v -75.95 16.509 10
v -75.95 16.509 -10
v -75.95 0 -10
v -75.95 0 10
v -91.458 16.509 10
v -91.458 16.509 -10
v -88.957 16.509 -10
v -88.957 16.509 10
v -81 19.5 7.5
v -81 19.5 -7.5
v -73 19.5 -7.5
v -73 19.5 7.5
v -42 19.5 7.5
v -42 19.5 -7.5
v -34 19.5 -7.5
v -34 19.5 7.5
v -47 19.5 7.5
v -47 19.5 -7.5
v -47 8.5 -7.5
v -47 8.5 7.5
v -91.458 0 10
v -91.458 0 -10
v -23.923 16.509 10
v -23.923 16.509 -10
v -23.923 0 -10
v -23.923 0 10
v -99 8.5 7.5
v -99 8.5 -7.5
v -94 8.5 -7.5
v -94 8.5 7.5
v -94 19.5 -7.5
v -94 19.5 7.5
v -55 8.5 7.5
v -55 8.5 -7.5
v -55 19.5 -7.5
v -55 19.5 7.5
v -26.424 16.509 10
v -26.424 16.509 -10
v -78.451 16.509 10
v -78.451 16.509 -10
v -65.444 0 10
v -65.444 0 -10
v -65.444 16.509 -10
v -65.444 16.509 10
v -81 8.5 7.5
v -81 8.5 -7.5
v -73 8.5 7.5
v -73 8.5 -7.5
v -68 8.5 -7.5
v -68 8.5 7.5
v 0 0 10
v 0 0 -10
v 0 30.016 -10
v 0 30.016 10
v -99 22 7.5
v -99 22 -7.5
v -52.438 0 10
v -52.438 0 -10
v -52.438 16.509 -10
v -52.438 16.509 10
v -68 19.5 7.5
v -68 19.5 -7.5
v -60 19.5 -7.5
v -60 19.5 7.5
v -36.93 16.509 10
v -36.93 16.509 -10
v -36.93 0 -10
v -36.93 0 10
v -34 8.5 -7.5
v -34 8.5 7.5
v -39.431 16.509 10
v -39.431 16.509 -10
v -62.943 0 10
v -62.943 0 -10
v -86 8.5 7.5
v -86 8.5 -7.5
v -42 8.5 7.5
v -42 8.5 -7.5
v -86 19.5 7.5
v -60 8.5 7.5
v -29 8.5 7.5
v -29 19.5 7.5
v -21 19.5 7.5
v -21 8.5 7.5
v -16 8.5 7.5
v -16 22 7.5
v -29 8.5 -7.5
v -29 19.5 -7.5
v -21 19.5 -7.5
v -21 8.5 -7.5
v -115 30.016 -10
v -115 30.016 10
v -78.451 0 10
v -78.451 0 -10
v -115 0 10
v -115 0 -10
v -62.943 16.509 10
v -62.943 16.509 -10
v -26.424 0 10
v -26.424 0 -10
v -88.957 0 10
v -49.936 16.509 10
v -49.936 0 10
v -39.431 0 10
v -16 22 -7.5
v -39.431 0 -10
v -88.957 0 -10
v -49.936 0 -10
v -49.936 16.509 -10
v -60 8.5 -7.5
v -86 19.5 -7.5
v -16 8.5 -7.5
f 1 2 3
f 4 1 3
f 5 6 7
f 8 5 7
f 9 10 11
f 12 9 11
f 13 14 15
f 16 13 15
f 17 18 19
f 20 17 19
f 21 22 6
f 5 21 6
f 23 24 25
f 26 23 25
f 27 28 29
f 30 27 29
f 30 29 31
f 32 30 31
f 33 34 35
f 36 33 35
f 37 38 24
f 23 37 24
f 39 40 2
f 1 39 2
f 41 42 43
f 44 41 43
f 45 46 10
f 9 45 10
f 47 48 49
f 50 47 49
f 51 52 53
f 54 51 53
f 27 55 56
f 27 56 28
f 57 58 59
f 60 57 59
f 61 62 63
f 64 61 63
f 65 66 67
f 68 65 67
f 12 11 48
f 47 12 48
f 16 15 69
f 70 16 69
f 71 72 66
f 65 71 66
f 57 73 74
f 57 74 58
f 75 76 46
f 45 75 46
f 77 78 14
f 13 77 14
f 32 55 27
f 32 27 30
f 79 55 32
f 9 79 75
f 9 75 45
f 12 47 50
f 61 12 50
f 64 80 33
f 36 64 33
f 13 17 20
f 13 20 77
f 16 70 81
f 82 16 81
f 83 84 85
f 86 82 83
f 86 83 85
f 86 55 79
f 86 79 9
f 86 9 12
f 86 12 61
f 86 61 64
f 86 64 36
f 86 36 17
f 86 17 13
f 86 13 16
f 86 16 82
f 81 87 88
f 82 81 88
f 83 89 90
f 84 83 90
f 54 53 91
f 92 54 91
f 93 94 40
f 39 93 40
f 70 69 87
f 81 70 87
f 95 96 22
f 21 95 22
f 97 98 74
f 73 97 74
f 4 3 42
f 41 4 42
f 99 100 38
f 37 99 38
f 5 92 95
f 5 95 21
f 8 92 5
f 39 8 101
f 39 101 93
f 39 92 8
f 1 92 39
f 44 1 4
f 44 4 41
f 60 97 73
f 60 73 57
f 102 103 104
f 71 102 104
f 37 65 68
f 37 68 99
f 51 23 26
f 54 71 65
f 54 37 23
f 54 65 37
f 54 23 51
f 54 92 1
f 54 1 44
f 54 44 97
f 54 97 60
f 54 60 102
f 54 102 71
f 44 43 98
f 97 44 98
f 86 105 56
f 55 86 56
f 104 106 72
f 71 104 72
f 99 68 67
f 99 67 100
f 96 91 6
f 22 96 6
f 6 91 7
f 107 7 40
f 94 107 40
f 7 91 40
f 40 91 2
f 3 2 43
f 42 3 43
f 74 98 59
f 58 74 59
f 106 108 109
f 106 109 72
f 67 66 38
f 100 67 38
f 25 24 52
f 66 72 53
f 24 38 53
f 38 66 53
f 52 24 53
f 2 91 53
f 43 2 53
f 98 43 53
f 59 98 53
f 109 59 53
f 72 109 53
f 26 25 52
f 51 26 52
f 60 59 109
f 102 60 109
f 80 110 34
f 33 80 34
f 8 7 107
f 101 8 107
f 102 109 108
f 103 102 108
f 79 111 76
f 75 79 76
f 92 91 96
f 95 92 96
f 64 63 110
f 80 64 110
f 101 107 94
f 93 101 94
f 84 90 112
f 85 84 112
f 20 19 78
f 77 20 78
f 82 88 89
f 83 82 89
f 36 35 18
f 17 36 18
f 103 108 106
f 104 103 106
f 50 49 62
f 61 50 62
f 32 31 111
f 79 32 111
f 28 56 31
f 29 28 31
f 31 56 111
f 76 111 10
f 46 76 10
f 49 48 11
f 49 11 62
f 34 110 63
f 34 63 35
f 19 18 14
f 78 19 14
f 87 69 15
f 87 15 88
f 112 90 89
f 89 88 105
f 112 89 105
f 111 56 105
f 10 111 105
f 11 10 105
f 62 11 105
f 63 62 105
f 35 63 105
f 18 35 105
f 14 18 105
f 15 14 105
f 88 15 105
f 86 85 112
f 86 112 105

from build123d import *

# Parameters (mm, degrees)
EXTRUDE_1_DEPTH      = 10
EXTRUDE_1_DEPTH_BACK = 10
EXTRUDE_2_DEPTH      = 7.5
EXTRUDE_2_DEPTH_BACK = 7.5


with BuildPart() as part:
    # 草图1 → 凸台-拉伸1 (new, two sides: drawn at the far end of the back side and taken through both)
    with BuildSketch(Plane.XY.offset(-EXTRUDE_1_DEPTH_BACK)):
        Polygon((0, 0), (0, 30.015544123), (-115, 30.015544123), (-115, 0), (-95.049223988, 0), (-91.457964947, 0), (-91.457964947, 16.508549547), (-88.956671933, 16.508549547), (-88.956671933, 0), (-78.451224874, 0), (-78.451224874, 16.508549547), (-75.94993186, 16.508549547), (-75.94993186, 0), (-65.444492256, 0), (-65.444492256, 16.508549547), (-62.943199242, 16.508549547), (-62.943199242, 0), (-52.43775591, 0), (-52.43775591, 16.508549547), (-49.936459169, 16.508549547), (-49.936459169, 0), (-39.431019564, 0), (-39.431019564, 16.508549547), (-36.929722823, 16.508549547), (-36.929722823, 0), (-26.424285082, 0), (-26.424285082, 16.508549547), (-23.922990204, 16.508549547), (-23.922990204, 0), align=None)
    extrude(amount=EXTRUDE_1_DEPTH + EXTRUDE_1_DEPTH_BACK)


with BuildPart() as body_2:
    # 草图2 → 凸台-拉伸2 (new, two sides: drawn at the far end of the back side and taken through both)
    with BuildSketch(Plane.XY.offset(-EXTRUDE_2_DEPTH_BACK)):
        Polygon((-98.999999464, 21.999999881), (-98.999999464, 8.500000462), (-93.999996781, 8.500000462), (-93.999996781, 19.500000402), (-86.000002921, 19.500000402), (-86.000002921, 8.500000462), (-81.000000238, 8.500000462), (-81.000000238, 19.500000402), (-72.999998927, 19.500000402), (-72.999998927, 8.500000462), (-68.000003695, 8.500000462), (-68.000003695, 19.500000402), (-59.999998659, 19.500000402), (-59.999998659, 8.500000462), (-54.999999702, 8.500000462), (-54.999999702, 19.500000402), (-46.999998391, 19.500000402), (-46.999998391, 8.500000462), (-41.999999434, 8.500000462), (-41.999999434, 19.500000402), (-34.000001848, 19.500000402), (-34.000001848, 8.500000462), (-28.999999166, 8.500000462), (-28.999999166, 19.500000402), (-20.999999717, 19.500000402), (-20.999999717, 8.500000462), (-16.00000076, 8.500000462), (-16.00000076, 21.999999881), align=None)
    extrude(amount=EXTRUDE_2_DEPTH + EXTRUDE_2_DEPTH_BACK)


solid = Compound([part.part, body_2.part])
